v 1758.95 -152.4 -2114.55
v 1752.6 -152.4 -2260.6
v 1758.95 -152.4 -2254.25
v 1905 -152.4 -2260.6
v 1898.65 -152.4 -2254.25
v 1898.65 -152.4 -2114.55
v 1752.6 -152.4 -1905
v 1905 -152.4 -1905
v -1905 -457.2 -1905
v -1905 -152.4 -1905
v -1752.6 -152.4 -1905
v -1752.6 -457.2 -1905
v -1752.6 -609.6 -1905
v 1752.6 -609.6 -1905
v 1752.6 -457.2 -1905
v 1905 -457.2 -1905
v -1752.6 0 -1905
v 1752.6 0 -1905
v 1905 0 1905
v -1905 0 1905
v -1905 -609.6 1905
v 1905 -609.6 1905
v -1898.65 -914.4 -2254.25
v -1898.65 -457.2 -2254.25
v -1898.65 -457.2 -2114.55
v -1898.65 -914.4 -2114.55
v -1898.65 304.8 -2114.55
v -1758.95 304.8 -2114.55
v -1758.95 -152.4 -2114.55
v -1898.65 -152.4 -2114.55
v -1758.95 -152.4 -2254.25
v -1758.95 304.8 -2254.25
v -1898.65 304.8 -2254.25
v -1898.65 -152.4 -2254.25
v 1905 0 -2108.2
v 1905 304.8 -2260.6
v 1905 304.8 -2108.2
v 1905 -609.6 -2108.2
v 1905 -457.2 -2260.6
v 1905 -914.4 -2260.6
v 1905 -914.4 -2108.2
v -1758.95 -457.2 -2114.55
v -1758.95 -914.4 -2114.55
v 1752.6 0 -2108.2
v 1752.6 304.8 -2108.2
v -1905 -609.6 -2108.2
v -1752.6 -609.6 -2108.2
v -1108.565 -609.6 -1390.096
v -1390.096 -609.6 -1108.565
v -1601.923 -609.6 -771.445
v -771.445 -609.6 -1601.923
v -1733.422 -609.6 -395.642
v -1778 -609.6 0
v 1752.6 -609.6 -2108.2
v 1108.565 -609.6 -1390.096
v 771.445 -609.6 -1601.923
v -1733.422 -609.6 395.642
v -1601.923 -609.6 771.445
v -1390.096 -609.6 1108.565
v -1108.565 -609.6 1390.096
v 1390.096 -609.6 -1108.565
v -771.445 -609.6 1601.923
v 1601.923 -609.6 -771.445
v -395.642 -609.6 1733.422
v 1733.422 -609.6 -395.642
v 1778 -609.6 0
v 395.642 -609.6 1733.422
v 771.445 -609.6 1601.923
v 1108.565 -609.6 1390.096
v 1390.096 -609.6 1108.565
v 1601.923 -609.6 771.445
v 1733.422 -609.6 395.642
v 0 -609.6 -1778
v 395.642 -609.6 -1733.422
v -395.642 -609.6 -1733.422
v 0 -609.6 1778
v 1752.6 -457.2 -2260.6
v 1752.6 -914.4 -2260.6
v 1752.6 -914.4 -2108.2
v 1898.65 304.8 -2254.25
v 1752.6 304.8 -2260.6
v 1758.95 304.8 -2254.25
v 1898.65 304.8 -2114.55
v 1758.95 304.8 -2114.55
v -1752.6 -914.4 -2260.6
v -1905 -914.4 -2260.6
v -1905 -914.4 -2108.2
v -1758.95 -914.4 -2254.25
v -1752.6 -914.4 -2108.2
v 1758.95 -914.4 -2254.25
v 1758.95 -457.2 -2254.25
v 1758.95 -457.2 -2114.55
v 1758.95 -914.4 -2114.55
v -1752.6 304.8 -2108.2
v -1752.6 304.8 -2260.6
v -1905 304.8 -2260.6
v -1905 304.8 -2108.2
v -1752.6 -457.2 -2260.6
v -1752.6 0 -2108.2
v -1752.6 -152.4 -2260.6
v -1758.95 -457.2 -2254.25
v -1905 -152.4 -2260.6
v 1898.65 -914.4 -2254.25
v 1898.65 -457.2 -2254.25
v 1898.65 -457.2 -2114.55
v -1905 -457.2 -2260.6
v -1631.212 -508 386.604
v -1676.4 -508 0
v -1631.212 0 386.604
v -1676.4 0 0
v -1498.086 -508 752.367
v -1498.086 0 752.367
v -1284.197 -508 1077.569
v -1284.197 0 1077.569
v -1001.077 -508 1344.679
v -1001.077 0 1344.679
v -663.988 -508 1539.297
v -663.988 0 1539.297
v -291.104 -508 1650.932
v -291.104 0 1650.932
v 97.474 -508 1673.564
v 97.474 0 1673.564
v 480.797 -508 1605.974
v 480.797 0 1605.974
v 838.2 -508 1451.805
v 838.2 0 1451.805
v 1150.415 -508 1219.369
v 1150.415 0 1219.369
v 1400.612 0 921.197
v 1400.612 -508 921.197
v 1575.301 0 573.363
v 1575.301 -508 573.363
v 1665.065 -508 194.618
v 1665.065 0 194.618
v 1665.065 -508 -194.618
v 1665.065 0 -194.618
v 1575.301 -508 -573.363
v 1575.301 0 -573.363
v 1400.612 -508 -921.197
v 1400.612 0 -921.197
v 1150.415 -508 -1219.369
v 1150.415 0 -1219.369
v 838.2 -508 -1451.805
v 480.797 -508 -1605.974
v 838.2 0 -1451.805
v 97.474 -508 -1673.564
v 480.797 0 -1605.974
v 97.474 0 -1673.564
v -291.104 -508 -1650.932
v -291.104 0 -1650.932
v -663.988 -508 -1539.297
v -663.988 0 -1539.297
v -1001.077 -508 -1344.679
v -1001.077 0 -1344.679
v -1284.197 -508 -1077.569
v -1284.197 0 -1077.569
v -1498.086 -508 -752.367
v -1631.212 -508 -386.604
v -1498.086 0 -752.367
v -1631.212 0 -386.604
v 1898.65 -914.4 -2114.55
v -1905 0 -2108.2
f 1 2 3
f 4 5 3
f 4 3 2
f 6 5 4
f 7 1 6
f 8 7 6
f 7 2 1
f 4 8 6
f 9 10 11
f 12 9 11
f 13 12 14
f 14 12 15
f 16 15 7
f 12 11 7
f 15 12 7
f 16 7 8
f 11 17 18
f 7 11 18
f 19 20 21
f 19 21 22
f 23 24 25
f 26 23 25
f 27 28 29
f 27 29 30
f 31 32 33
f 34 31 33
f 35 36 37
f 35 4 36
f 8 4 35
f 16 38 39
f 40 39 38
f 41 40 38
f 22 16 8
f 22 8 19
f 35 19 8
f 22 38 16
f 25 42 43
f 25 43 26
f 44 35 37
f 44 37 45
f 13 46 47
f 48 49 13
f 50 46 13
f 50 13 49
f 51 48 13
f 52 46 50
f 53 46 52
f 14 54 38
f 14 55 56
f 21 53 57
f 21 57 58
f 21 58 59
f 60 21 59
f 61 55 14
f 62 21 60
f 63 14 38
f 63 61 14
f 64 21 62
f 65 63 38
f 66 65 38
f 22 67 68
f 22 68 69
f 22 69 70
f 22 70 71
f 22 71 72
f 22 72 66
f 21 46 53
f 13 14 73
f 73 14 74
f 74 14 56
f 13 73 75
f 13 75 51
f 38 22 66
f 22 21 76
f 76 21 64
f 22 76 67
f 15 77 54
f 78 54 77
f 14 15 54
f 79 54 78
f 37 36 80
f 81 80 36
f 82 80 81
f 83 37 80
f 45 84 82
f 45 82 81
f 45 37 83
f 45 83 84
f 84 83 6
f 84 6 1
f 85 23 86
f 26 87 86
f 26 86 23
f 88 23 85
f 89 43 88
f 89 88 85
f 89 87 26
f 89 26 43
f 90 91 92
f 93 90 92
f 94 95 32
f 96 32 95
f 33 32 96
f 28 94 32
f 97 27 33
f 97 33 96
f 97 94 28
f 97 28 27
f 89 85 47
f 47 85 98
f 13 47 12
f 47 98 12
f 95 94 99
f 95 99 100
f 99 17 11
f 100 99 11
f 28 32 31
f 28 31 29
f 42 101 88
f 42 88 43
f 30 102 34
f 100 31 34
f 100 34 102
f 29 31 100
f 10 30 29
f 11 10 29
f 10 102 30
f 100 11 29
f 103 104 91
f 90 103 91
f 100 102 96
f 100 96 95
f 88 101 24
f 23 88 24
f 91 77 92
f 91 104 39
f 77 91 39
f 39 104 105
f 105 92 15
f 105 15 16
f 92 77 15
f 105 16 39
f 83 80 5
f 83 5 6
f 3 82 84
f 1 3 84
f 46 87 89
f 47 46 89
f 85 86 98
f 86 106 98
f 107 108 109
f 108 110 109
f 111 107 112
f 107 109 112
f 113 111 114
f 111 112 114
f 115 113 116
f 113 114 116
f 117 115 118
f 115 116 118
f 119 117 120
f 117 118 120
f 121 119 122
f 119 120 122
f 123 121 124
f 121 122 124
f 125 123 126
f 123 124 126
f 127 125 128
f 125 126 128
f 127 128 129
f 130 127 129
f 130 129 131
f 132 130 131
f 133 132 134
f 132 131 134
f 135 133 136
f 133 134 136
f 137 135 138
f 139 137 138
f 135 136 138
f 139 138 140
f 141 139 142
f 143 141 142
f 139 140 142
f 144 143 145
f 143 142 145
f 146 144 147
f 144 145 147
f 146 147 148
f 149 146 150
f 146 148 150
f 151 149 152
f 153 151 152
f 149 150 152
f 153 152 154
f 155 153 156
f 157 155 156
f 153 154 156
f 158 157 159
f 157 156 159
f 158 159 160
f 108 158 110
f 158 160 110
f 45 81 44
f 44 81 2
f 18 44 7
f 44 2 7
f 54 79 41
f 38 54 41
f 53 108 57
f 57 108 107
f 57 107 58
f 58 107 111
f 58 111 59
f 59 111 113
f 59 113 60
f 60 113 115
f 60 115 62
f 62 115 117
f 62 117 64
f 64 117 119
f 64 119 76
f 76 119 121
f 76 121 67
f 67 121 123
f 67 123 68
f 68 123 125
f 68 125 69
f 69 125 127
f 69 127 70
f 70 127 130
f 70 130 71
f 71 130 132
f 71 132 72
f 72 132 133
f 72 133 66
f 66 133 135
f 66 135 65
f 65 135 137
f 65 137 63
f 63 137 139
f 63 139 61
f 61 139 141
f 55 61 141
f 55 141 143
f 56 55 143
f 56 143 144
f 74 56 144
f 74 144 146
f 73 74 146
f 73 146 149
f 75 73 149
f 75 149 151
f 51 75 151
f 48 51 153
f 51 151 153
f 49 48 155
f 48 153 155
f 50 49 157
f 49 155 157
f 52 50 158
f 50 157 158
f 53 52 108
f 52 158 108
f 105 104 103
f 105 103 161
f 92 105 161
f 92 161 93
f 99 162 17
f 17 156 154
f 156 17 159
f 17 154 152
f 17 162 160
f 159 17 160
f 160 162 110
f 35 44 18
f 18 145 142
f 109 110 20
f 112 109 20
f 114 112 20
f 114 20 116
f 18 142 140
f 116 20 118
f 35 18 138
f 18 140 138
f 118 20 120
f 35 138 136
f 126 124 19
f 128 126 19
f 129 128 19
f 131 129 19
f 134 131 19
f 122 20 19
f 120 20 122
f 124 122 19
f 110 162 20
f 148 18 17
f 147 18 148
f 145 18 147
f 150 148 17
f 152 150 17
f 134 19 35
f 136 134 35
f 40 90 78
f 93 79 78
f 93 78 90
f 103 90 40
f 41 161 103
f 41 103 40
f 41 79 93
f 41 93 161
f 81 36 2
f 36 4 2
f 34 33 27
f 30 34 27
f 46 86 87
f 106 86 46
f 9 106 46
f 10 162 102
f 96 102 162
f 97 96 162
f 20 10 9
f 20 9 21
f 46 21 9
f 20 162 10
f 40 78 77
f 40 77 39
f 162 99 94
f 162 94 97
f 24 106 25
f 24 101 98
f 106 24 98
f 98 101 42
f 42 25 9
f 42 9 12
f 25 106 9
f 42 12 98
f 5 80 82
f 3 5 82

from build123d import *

# Parameters (mm, degrees)
F0_W           = 3810
F0_H           = 3810
F1_DEPTH       = 609.6
F3_D           = 3352.8
F3_CSINK_D     = 3556
F3_CSINK_ANGLE = 90
F4_W           = 152.4
F4_H           = 152.4
F5_DEPTH       = 355.6
F6_W           = 152.4
F6_H           = 152.4
F7_DEPTH       = 304.8
F8_W           = 152.4
F8_H           = 152.4
F9_DEPTH       = 304.8
F11_W          = 139.7
F11_H          = 139.7
F12_DEPTH      = 1270


with BuildPart() as f1:
    # F0 (on Front) → F1 (new body)
    with BuildSketch(Plane.XZ):
        Rectangle(F0_W, F0_H)
    extrude(amount=F1_DEPTH)

    # F3 (through all)
    with Locations(Plane.XZ.offset(609.6)):
        with Locations((0, 0)):
            CounterSinkHole(F3_D / 2, F3_CSINK_D / 2, counter_sink_angle=F3_CSINK_ANGLE)

    # F4 (on face) → F5 (join)
    with BuildSketch(Plane(origin=(0, 0, -1905), x_dir=(1, 0, 0), z_dir=(0, 0, -1))):
        with Locations((-1828.8, 533.4)):
            Rectangle(F4_W, F4_H)
        with Locations((-1828.8, 76.2)):
            Rectangle(F4_W, F4_H)
        with Locations((1828.8, 76.2)):
            Rectangle(F4_W, F4_H)
        with Locations((1828.8, 533.4)):
            Rectangle(F4_W, F4_H)
    extrude(amount=F5_DEPTH)

    # F6 (on face) → F7 (join)
    with BuildSketch(Plane(origin=(0, 0, 0), x_dir=(-1, 0, 0), z_dir=(0, 1, 0))):
        with Locations((-1828.8, -2184.4)):
            Rectangle(F6_W, F6_H)
        with Locations((1828.8, -2184.4)):
            Rectangle(F6_W, F6_H)
    extrude(amount=F7_DEPTH)

    # F8 (on face) → F9 (join)
    with BuildSketch(Plane.XZ.offset(609.6)):
        with Locations((-1828.8, -2184.4)):
            Rectangle(F8_W, F8_H)
        with Locations((1828.8, -2184.4)):
            Rectangle(F8_W, F8_H)
    extrude(amount=F9_DEPTH)

    # F11 (on face) → F12 (cut)
    with BuildSketch(Plane(origin=(0, 304.8, 0), x_dir=(-1, 0, 0), z_dir=(0, 1, 0))):
        with Locations((-1828.8, -2184.4)):
            Rectangle(F11_W, F11_H)
        with Locations((1828.8, -2184.4)):
            Rectangle(F11_W, F11_H)
    extrude(amount=-F12_DEPTH, mode=Mode.SUBTRACT)


solid = f1.part
